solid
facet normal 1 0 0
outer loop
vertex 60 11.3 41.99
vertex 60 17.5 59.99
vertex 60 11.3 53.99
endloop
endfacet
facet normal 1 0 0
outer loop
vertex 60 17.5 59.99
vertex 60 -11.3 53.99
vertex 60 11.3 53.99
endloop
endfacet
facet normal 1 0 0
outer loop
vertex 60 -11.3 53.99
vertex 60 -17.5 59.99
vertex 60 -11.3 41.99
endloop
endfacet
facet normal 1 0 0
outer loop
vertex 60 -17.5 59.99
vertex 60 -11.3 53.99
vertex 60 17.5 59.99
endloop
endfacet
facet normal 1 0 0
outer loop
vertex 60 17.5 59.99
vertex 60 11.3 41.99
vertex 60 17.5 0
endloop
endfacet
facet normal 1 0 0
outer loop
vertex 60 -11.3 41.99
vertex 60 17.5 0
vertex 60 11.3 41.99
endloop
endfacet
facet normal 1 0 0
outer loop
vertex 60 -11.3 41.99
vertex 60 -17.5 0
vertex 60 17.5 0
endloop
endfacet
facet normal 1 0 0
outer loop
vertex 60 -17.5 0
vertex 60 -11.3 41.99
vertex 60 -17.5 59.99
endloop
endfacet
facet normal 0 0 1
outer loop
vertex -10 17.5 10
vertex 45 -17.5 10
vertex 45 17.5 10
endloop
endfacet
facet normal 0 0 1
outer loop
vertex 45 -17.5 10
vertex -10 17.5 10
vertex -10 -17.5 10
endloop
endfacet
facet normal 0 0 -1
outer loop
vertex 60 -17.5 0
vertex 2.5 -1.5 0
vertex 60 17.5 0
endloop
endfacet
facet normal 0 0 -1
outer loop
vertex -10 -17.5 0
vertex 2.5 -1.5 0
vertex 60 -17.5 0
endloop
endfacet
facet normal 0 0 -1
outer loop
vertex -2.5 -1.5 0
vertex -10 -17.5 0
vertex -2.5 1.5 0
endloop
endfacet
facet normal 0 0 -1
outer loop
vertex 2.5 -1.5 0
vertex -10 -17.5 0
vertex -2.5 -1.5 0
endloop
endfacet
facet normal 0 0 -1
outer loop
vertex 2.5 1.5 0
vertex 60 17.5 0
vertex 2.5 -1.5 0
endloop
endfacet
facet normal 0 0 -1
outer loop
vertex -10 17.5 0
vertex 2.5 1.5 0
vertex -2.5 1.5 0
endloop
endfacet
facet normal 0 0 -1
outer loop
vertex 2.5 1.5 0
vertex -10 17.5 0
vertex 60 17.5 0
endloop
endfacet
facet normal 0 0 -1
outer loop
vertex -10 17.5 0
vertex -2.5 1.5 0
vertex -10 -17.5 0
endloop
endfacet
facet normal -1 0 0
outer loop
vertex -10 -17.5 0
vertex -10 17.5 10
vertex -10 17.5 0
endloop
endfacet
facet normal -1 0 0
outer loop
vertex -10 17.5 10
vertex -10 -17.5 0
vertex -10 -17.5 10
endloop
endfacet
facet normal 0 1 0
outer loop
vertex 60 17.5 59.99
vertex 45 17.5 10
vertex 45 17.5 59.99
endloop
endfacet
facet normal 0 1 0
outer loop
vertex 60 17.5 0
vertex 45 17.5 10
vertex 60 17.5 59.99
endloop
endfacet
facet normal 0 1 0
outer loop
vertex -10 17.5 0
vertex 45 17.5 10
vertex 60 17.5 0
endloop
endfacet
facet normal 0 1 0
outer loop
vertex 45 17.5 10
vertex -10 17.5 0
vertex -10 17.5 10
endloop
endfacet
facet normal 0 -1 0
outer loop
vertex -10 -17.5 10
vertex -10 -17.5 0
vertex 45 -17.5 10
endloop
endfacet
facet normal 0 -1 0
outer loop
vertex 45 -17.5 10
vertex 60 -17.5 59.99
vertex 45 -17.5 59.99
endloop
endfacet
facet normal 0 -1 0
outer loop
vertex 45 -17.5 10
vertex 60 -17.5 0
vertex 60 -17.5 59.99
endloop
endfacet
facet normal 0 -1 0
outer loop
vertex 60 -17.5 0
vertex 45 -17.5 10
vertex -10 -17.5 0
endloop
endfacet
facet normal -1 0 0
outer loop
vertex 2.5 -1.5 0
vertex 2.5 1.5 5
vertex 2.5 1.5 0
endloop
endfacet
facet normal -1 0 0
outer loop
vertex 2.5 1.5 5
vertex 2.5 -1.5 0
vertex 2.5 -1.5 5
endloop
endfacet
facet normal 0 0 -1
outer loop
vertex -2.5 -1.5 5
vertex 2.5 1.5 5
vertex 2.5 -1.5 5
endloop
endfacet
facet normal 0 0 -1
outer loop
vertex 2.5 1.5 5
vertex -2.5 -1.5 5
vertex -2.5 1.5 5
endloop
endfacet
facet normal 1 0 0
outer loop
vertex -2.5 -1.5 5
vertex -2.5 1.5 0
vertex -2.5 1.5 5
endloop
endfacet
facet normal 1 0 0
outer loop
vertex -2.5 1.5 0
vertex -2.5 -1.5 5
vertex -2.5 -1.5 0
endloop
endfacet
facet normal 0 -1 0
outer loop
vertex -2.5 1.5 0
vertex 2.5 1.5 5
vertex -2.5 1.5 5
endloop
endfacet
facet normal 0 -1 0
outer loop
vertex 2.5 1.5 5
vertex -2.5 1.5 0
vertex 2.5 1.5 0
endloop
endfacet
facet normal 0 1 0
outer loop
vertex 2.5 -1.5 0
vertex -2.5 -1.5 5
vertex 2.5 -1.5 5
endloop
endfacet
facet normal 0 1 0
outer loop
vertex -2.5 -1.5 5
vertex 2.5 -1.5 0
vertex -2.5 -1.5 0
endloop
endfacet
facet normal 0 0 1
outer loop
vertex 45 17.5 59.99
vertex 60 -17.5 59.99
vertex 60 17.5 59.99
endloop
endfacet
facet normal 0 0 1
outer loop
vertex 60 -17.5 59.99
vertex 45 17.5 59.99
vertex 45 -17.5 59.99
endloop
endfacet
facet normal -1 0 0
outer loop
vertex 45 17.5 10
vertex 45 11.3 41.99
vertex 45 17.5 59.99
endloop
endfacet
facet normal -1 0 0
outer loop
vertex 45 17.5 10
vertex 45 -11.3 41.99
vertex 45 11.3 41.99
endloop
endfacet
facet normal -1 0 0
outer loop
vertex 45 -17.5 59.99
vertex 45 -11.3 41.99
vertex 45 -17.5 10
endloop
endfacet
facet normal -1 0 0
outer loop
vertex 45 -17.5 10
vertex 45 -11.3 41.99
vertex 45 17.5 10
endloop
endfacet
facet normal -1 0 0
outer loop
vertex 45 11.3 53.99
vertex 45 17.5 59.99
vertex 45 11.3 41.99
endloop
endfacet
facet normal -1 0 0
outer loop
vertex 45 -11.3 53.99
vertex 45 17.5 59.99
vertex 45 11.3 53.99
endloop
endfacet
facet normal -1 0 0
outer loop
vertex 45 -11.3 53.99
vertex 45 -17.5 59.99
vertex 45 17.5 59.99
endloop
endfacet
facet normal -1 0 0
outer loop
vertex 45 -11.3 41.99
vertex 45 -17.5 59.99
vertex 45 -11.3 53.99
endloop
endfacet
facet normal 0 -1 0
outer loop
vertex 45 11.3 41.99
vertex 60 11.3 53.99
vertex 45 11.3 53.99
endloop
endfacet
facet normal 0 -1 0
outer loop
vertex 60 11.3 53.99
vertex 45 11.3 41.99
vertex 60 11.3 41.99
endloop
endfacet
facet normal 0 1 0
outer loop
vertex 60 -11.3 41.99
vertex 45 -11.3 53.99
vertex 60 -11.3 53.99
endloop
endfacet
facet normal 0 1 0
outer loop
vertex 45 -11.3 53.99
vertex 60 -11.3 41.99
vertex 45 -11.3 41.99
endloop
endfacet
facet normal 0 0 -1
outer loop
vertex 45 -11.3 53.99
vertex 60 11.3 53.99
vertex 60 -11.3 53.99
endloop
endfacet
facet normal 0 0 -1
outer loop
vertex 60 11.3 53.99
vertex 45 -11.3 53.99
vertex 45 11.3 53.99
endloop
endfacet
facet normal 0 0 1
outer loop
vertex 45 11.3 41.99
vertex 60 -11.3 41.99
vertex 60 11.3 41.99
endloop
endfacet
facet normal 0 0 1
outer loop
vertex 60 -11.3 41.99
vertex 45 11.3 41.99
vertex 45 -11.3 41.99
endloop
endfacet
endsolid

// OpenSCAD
eps = 0.01;
fit_eps = 1;

attachment = [5,3,10];// + [fit_eps/2, fit_eps/2, fit_eps/2]; //stepper attachment flange
stepper_flange_block = [70,35,10];

servo_lower = [22.6,12,18];// + [fit_eps, fit_eps, fit_eps];


difference(){
	translate([-10, -stepper_flange_block[1]/2,0]){
		cube(stepper_flange_block);
	}
	cube(attachment, center=true);
}


difference(){
	translate([stepper_flange_block[0]-10-15, -stepper_flange_block[1]/2,stepper_flange_block[2]-eps]){
		cube([15,stepper_flange_block[1],50]);
	}
	translate([stepper_flange_block[0]-25-eps, -servo_lower[0]/2,stepper_flange_block[2]+50-servo_lower[2]-eps]){
		rotate([90,0,90]){
			    cube(servo_lower);
	    	}
	}
}

color("red"){
}
